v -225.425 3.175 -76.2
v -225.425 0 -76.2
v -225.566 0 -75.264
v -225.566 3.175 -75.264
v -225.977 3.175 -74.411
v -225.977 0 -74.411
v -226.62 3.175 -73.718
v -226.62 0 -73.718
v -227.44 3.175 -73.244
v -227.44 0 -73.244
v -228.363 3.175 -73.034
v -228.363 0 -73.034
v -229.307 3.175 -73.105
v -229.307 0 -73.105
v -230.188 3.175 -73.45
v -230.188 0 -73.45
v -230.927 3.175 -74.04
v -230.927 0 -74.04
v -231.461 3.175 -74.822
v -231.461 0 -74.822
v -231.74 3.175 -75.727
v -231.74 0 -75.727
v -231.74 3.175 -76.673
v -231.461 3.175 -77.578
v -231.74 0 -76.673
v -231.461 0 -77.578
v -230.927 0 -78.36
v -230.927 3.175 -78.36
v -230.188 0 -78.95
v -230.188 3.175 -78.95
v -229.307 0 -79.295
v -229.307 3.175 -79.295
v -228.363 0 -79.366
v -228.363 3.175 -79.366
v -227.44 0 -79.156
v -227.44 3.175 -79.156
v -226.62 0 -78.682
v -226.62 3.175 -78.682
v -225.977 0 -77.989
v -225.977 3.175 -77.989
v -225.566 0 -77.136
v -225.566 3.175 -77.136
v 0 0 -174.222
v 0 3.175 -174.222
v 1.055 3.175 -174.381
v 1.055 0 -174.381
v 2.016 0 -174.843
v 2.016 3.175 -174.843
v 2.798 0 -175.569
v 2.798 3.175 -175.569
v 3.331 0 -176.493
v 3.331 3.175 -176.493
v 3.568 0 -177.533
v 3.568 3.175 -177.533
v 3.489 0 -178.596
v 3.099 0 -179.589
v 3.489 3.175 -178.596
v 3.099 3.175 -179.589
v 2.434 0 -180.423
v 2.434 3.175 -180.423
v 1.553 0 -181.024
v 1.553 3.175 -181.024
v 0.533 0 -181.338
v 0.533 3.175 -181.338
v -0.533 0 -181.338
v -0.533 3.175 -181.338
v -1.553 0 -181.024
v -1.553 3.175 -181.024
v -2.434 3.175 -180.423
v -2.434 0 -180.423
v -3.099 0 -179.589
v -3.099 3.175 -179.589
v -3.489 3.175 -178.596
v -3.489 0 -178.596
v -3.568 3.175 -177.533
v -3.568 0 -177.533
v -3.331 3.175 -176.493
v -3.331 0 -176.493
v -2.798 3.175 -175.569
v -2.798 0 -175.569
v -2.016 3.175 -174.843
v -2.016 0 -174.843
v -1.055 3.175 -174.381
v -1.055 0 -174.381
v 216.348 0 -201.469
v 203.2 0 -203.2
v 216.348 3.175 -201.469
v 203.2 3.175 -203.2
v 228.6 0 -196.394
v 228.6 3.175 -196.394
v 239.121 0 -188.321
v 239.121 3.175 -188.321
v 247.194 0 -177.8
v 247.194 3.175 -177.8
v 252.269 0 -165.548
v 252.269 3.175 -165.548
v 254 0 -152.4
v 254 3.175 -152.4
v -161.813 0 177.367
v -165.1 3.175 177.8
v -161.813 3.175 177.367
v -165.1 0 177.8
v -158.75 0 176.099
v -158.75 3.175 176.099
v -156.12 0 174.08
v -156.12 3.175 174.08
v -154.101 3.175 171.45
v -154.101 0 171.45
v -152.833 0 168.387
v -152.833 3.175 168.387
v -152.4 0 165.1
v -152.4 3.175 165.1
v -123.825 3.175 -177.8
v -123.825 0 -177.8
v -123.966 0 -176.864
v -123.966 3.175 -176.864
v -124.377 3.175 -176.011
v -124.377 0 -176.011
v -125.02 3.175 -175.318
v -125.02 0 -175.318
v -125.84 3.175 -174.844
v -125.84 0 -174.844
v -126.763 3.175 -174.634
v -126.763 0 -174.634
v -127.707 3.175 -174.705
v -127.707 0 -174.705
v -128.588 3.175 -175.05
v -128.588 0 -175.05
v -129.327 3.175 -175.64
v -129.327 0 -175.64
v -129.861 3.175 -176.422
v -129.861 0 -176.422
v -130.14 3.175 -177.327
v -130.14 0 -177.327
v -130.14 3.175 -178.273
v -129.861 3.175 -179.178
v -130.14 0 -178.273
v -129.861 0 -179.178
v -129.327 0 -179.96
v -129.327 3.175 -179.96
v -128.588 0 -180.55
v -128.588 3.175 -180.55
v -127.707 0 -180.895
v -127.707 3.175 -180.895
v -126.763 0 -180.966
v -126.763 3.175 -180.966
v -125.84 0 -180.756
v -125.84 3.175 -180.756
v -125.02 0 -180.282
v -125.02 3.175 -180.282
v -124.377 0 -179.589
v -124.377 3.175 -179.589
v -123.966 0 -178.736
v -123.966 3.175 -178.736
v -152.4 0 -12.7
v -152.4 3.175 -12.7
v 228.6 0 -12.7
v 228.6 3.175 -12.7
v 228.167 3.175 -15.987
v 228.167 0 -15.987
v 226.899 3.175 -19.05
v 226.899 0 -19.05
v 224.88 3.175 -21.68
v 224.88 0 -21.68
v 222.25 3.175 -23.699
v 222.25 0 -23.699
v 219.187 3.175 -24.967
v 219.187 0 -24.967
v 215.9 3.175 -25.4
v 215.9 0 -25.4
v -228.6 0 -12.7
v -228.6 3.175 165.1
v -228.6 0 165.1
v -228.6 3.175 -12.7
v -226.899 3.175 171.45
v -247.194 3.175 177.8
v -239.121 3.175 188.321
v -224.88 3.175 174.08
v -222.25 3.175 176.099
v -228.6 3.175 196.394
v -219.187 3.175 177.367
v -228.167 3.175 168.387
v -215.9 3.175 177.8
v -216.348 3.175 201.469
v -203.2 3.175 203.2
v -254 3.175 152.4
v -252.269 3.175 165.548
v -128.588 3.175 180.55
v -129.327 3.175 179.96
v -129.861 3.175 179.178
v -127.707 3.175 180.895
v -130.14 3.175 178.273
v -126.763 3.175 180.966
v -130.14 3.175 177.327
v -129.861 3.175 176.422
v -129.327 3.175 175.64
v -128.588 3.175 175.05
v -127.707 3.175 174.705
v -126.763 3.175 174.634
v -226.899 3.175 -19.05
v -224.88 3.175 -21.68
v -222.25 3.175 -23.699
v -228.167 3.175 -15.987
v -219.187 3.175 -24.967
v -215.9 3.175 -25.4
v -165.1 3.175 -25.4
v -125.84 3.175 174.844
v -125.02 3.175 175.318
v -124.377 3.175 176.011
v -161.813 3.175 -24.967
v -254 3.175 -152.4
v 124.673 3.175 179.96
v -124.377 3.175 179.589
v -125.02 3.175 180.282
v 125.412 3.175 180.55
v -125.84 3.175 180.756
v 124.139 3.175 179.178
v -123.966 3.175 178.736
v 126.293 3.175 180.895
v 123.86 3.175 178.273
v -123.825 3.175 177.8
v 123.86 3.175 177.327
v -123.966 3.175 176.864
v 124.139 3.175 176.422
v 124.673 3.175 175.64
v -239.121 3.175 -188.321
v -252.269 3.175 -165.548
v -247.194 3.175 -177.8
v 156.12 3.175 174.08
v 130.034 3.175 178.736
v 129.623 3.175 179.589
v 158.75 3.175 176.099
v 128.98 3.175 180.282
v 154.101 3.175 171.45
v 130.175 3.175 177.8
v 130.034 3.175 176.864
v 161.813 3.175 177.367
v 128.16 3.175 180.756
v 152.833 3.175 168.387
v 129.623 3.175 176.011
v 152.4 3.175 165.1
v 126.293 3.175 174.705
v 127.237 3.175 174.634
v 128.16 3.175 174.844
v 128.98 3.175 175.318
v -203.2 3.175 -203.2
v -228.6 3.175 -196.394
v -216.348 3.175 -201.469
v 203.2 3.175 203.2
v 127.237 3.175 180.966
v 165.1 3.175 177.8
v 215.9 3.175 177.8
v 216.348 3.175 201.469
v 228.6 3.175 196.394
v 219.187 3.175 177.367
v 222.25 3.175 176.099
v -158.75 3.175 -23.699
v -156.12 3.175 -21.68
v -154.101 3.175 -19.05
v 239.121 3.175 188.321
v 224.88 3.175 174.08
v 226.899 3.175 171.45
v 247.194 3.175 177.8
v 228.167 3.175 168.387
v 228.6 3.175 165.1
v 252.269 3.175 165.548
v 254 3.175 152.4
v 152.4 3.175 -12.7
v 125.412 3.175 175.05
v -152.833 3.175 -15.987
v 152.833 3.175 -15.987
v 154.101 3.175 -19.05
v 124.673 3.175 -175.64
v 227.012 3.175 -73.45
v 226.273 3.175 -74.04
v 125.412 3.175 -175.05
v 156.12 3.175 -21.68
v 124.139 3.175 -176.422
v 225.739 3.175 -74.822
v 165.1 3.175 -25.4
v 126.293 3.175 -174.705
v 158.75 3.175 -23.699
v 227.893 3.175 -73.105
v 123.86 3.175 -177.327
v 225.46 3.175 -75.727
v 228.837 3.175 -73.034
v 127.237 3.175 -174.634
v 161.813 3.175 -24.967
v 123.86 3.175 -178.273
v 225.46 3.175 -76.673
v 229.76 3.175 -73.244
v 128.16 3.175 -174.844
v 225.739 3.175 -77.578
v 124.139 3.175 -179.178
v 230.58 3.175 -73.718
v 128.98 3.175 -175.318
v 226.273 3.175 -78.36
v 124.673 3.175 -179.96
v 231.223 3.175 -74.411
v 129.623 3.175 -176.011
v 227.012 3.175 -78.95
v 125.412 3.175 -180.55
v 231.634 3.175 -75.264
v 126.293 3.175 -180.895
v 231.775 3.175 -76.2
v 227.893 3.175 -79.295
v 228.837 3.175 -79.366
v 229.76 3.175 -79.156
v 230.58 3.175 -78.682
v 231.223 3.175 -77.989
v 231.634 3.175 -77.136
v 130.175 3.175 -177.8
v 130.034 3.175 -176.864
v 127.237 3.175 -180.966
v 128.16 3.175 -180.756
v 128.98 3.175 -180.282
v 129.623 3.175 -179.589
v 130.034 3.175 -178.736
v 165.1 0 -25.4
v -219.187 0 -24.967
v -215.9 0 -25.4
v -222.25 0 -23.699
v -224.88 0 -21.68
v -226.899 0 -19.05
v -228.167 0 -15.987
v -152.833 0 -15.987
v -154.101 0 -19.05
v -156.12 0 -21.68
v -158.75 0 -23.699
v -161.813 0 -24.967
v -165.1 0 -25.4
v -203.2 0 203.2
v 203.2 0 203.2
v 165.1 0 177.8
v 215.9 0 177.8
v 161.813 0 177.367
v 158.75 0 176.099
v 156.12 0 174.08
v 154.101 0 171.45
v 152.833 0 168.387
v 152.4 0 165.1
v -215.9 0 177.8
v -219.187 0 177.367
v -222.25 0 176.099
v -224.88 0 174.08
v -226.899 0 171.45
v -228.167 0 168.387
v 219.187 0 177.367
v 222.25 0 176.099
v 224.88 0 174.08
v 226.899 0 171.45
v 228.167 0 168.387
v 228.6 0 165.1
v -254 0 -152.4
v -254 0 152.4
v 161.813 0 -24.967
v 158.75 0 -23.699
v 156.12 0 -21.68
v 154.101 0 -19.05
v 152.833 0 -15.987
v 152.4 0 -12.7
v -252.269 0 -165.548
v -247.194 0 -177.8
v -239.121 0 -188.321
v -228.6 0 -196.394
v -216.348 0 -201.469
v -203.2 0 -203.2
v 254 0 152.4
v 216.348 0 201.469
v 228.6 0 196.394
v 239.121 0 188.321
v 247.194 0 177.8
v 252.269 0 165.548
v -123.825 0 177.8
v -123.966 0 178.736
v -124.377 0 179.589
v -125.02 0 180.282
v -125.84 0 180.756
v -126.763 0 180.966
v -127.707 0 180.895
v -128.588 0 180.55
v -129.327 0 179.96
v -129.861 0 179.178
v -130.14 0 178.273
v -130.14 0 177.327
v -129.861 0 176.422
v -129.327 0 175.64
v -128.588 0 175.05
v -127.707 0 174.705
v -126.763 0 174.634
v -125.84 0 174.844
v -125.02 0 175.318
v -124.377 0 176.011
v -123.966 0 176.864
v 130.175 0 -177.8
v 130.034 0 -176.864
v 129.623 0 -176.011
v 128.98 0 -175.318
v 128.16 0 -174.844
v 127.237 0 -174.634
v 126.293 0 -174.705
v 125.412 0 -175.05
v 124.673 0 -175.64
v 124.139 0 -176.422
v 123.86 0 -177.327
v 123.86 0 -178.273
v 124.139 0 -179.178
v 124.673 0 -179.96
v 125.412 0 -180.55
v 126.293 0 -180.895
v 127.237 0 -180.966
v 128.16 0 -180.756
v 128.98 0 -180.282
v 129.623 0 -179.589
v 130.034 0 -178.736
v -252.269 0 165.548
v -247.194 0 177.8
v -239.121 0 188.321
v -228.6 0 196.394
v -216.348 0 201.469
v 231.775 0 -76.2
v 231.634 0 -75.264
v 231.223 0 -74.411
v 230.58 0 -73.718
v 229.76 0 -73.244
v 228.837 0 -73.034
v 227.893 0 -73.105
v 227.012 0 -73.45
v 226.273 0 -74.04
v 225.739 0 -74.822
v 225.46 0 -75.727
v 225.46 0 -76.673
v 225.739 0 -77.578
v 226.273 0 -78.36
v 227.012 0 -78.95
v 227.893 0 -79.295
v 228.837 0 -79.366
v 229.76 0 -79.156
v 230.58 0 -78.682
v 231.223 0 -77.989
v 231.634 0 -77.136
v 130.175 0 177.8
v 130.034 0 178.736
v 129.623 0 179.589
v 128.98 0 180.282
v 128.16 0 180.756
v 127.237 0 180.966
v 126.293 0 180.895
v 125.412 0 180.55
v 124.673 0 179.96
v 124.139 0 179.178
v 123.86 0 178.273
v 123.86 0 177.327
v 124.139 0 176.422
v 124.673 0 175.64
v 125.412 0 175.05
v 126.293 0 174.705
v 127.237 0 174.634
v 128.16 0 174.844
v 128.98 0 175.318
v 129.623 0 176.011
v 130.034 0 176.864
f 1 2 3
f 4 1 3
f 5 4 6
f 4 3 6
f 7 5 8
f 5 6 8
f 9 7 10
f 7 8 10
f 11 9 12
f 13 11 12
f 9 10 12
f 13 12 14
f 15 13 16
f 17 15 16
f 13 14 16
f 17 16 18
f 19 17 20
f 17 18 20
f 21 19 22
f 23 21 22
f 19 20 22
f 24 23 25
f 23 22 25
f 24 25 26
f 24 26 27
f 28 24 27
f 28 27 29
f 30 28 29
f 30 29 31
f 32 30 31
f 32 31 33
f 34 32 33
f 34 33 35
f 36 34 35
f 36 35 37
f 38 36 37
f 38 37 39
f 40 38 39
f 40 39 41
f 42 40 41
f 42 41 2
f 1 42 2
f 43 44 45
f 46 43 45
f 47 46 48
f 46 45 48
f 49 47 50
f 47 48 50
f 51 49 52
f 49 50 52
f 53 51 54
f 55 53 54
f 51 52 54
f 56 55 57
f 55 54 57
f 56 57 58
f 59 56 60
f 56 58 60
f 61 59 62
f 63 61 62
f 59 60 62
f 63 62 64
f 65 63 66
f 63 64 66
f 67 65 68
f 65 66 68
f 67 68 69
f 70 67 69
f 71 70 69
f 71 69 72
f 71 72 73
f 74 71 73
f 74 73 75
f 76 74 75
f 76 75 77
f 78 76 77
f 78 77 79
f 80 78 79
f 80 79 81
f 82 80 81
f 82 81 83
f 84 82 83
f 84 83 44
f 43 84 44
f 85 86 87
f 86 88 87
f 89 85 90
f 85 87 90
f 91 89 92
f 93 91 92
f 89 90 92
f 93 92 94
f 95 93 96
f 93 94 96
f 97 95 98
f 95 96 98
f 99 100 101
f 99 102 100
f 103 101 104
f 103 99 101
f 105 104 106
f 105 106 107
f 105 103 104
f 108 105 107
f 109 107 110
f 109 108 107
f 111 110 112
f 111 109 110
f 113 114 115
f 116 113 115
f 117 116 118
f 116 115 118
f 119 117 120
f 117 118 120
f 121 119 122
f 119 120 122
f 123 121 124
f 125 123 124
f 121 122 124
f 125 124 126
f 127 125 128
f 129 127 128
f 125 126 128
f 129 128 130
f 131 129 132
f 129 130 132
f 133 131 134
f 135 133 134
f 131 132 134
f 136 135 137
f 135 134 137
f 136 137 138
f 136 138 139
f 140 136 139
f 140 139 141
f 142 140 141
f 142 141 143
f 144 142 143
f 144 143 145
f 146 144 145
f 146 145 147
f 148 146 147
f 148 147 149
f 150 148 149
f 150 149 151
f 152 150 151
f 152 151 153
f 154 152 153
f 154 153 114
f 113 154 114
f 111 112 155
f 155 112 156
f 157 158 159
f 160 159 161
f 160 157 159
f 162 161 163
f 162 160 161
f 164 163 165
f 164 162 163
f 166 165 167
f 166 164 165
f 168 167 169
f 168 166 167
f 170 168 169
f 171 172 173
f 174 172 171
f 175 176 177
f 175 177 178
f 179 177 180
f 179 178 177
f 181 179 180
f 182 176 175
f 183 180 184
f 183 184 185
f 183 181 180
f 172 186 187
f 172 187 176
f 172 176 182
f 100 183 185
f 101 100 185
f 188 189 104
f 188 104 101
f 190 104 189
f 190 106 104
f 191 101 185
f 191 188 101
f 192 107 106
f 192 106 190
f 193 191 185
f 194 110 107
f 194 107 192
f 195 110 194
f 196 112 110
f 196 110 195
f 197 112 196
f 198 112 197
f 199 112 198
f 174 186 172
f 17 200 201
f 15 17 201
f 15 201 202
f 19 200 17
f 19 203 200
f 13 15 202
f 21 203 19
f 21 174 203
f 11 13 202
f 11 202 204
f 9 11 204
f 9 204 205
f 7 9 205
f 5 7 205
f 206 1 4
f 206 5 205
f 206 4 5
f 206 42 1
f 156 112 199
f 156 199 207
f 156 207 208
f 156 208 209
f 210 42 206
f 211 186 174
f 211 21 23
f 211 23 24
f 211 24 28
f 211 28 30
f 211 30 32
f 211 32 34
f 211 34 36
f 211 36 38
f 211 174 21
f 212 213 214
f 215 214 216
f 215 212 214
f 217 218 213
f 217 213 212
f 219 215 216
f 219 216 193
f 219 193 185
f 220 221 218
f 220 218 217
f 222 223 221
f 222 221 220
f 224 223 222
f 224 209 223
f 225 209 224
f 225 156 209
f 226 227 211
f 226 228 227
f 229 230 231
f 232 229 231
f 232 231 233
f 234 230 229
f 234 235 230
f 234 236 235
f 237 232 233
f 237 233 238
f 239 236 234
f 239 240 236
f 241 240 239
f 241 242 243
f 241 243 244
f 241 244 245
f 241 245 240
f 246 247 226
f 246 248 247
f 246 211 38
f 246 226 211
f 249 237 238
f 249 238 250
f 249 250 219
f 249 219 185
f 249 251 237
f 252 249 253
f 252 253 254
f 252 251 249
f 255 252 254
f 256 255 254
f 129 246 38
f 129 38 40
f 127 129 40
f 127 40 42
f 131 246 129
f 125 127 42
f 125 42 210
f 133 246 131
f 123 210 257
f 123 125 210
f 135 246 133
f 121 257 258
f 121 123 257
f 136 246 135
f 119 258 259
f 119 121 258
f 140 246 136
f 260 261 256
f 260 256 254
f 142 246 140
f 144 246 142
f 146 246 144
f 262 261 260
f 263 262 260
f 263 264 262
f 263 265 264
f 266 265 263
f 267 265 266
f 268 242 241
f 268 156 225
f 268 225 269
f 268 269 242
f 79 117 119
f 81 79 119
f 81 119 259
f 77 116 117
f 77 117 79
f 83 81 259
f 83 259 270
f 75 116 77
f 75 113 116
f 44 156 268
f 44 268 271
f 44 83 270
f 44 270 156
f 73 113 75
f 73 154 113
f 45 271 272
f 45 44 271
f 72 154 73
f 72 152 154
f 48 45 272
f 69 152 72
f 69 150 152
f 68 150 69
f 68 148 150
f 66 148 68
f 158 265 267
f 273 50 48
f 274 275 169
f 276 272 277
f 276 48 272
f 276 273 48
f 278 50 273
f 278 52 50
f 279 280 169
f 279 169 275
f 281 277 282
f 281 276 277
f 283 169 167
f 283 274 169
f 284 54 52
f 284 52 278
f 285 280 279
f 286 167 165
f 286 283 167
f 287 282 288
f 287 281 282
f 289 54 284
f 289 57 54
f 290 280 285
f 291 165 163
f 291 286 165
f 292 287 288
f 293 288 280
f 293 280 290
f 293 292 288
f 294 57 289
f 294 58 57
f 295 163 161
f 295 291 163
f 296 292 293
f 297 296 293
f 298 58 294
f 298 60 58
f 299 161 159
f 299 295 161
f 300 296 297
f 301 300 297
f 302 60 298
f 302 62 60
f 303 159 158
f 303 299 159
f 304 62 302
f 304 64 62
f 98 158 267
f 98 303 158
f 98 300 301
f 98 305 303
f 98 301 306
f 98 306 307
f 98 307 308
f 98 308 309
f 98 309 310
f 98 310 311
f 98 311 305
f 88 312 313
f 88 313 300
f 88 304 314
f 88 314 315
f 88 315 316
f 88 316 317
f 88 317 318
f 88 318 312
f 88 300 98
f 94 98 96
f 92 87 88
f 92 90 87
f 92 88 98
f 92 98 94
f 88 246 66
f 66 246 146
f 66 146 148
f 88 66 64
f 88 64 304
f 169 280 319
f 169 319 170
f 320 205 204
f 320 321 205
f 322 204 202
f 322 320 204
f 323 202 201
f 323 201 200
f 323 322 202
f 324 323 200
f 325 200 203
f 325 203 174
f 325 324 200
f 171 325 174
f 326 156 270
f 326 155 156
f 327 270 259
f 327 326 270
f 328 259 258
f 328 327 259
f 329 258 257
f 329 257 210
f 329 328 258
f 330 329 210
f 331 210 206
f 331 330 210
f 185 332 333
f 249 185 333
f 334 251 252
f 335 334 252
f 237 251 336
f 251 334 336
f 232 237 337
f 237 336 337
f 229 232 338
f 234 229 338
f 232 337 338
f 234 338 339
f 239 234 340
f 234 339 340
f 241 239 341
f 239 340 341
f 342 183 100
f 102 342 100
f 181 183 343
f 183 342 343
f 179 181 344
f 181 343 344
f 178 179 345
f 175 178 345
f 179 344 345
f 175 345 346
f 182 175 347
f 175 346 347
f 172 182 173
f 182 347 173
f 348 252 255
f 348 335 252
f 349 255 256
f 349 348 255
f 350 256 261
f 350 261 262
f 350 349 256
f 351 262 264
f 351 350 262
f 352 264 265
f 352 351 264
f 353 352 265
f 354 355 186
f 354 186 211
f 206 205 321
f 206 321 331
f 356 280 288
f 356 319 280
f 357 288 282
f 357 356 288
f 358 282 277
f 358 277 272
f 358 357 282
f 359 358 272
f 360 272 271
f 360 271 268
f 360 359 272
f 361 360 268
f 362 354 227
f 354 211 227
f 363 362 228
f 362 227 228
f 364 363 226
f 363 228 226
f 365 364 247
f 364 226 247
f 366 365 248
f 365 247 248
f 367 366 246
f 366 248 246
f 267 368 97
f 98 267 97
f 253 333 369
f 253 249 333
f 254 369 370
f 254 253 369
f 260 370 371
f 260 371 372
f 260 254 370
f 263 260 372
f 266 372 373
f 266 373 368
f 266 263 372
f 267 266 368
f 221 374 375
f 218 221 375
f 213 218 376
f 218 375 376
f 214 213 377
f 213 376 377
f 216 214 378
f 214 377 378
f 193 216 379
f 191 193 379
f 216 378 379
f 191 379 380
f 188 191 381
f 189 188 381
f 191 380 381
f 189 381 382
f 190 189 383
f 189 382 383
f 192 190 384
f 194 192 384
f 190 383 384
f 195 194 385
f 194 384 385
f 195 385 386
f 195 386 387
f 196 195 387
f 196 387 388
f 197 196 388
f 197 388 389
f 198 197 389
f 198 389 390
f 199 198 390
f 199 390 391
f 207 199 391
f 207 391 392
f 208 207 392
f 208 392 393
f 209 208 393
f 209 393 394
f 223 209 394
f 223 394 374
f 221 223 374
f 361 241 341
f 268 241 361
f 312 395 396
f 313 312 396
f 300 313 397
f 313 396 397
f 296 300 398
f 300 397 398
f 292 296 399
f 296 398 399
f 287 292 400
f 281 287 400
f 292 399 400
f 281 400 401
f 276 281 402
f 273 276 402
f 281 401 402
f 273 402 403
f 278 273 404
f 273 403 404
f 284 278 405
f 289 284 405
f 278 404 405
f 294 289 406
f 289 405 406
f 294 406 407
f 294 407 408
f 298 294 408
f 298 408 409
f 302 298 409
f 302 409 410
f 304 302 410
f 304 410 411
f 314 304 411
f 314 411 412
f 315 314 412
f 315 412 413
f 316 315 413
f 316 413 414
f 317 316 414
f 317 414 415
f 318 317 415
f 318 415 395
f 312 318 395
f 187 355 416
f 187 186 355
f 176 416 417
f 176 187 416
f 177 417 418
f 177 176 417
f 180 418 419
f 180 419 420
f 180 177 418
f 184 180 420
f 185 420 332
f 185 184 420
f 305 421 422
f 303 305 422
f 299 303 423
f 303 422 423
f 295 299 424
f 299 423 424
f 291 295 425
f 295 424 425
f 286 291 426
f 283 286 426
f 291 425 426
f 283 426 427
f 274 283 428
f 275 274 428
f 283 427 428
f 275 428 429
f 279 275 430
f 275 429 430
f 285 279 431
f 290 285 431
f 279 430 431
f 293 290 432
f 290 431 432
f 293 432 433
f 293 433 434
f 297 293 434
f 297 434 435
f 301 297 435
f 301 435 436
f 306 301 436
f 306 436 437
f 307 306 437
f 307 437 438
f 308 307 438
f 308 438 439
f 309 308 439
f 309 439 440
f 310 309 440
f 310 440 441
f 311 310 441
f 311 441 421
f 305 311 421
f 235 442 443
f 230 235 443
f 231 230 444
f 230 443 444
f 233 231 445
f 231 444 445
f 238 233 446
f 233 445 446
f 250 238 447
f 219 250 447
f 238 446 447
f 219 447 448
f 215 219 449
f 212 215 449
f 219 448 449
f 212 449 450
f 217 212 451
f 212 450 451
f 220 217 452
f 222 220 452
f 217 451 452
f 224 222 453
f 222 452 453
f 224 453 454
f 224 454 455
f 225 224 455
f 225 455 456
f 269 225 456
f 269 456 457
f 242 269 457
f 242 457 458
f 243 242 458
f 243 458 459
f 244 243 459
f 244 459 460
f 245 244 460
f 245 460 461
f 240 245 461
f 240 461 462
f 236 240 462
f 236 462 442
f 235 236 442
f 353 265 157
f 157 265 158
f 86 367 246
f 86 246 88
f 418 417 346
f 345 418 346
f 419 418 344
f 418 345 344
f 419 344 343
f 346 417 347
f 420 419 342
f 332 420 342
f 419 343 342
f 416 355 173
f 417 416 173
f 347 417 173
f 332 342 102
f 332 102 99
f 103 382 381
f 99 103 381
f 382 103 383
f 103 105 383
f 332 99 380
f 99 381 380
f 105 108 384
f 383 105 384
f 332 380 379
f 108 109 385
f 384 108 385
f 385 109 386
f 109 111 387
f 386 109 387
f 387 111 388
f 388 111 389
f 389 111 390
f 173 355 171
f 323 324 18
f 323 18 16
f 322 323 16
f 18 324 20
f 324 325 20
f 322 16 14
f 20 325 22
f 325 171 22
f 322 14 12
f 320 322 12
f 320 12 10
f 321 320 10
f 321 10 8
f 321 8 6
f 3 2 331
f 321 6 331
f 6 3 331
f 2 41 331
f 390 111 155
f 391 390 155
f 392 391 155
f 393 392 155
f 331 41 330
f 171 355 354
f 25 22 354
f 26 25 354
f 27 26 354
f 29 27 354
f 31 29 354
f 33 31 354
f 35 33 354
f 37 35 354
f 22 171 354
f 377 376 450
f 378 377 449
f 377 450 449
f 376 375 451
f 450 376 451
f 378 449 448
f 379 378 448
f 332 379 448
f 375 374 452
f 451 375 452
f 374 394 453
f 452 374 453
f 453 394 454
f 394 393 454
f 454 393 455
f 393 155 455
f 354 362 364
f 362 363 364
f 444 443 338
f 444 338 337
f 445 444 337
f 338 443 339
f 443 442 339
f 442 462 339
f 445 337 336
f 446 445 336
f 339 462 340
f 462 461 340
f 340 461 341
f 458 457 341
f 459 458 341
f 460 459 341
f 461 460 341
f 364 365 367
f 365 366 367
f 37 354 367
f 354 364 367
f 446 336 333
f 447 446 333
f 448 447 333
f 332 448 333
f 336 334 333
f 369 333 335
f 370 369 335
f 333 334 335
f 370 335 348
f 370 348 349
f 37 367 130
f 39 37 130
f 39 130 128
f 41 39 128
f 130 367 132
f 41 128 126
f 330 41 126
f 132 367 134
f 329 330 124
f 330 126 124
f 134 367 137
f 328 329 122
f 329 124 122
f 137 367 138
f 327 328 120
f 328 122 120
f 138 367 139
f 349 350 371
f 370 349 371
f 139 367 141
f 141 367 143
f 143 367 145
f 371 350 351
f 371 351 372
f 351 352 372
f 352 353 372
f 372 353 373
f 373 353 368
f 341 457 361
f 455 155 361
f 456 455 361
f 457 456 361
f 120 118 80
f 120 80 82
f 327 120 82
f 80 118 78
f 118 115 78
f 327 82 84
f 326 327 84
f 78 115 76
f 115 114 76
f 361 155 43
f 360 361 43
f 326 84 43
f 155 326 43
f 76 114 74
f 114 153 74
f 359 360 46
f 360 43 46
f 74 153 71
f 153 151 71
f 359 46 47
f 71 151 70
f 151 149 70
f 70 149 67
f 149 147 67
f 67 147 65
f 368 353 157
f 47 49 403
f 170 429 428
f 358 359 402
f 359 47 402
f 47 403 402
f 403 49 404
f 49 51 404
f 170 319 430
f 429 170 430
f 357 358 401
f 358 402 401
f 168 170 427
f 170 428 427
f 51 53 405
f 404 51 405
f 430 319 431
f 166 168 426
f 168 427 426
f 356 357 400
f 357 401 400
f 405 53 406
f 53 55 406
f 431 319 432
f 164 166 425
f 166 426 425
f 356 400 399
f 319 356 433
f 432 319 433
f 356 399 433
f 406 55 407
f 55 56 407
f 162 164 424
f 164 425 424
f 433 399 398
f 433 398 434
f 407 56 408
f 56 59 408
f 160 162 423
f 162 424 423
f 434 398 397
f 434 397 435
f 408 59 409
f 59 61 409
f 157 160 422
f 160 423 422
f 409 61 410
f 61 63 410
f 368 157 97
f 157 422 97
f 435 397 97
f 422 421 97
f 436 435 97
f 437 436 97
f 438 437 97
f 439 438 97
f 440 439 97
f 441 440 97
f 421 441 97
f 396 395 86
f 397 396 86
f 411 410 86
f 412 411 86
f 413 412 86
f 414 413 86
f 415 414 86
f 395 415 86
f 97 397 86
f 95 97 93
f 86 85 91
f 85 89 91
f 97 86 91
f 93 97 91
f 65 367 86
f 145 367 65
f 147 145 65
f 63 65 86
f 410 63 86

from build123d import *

# Parameters (mm, degrees)
SKETCH1_W                       = 508
SKETCH1_H                       = 406.4
EXTRUDE1_DEPTH                  = 3.175
SKETCH2_W                       = 76.2
SKETCH2_H                       = 203.2
EXTRUDE2_DEPTH                  = 326.294206258
FILLET2_R                       = 50.8
FILLET3_R                       = 12.7
F_1_4_0_25_DIAMETER_HOLE1_D     = 6.35
F_1_4_0_25_DIAMETER_HOLE1_DEPTH = 25.4
F_1_4_0_25_DIAMETER_HOLE1_TIP   = 1.907732465
CUT_EXTRUDE1_REACH              = 327.294
SKETCH5_R                       = 3.57844787


with BuildPart() as part:
    # Sketch1 → Extrude1 (new body)
    with BuildSketch(Plane(origin=(0, 0, 0), x_dir=(1, 0, 0), z_dir=(0, 1, 0))):
        Rectangle(SKETCH1_W, SKETCH1_H)
    extrude(amount=EXTRUDE1_DEPTH)

    # Sketch2 → Extrude2 (cut, through all)
    with BuildSketch(Plane(origin=(0, 3.175, 0), x_dir=(1, 0, 0), z_dir=(0, 1, 0))):
        with Locations((-190.5, -76.2)):
            Rectangle(SKETCH2_W, SKETCH2_H)
        with Locations((190.5, -76.2)):
            Rectangle(SKETCH2_W, SKETCH2_H)
    extrude(amount=-EXTRUDE2_DEPTH, mode=Mode.SUBTRACT)

    # Fillet2
    fillet2_edges = [part.edges().sort_by_distance(p)[0] for p in [
        (-254, 1.5875, -203.2),
        (254, 1.5875, -203.2),
        (254, 1.5875, 203.2),
        (-254, 1.5875, 203.2),
    ]]
    fillet(fillet2_edges, radius=FILLET2_R)

    # Fillet3
    fillet3_edges = [part.edges().sort_by_distance(p)[0] for p in [
        (-228.6, 1.5875, 177.8),
        (-228.6, 1.5875, -25.4),
        (-152.4, 1.5875, -25.4),
        (-152.4, 1.5875, 177.8),
        (152.4, 1.5875, 177.8),
        (152.4, 1.5875, -25.4),
        (228.6, 1.5875, -25.4),
        (228.6, 1.5875, 177.8),
    ]]
    fillet(fillet3_edges, radius=FILLET3_R)

    # 1/4 (0.25) Diameter Hole1
    with Locations(Plane(origin=(0, 3.175, 0), x_dir=(-1, 0, 0), z_dir=(0, 1, 0))):
        with Locations((127, -177.8), (-127, -177.8), (-228.6, -76.2), (228.6, -76.2), (127, 177.8), (-127, 177.8)):
            Hole(F_1_4_0_25_DIAMETER_HOLE1_D / 2, depth=F_1_4_0_25_DIAMETER_HOLE1_DEPTH)
            with Locations((0, 0, -(F_1_4_0_25_DIAMETER_HOLE1_DEPTH + F_1_4_0_25_DIAMETER_HOLE1_TIP / 2))):  # 118° drill point
                Cone(0, F_1_4_0_25_DIAMETER_HOLE1_D / 2, F_1_4_0_25_DIAMETER_HOLE1_TIP, mode=Mode.SUBTRACT)

    # Sketch5 → Cut-Extrude1 (cut, up to next)
    with BuildSketch(Plane(origin=(0, 3.175, 0), x_dir=(1, 0, 0), z_dir=(0, 1, 0)), mode=Mode.PRIVATE) as cut_extrude1_sk1:
        with Locations(Location((0, 177.8, 0), (0, 0, 270))):
            Circle(SKETCH5_R)
    cut_extrude1_tool1 = extrude(cut_extrude1_sk1.sketch, amount=-CUT_EXTRUDE1_REACH, mode=Mode.PRIVATE) & part.part
    add(cut_extrude1_tool1.solids().sort_by_distance((0, 3.175, -177.8))[0], mode=Mode.SUBTRACT)


solid = part.part
